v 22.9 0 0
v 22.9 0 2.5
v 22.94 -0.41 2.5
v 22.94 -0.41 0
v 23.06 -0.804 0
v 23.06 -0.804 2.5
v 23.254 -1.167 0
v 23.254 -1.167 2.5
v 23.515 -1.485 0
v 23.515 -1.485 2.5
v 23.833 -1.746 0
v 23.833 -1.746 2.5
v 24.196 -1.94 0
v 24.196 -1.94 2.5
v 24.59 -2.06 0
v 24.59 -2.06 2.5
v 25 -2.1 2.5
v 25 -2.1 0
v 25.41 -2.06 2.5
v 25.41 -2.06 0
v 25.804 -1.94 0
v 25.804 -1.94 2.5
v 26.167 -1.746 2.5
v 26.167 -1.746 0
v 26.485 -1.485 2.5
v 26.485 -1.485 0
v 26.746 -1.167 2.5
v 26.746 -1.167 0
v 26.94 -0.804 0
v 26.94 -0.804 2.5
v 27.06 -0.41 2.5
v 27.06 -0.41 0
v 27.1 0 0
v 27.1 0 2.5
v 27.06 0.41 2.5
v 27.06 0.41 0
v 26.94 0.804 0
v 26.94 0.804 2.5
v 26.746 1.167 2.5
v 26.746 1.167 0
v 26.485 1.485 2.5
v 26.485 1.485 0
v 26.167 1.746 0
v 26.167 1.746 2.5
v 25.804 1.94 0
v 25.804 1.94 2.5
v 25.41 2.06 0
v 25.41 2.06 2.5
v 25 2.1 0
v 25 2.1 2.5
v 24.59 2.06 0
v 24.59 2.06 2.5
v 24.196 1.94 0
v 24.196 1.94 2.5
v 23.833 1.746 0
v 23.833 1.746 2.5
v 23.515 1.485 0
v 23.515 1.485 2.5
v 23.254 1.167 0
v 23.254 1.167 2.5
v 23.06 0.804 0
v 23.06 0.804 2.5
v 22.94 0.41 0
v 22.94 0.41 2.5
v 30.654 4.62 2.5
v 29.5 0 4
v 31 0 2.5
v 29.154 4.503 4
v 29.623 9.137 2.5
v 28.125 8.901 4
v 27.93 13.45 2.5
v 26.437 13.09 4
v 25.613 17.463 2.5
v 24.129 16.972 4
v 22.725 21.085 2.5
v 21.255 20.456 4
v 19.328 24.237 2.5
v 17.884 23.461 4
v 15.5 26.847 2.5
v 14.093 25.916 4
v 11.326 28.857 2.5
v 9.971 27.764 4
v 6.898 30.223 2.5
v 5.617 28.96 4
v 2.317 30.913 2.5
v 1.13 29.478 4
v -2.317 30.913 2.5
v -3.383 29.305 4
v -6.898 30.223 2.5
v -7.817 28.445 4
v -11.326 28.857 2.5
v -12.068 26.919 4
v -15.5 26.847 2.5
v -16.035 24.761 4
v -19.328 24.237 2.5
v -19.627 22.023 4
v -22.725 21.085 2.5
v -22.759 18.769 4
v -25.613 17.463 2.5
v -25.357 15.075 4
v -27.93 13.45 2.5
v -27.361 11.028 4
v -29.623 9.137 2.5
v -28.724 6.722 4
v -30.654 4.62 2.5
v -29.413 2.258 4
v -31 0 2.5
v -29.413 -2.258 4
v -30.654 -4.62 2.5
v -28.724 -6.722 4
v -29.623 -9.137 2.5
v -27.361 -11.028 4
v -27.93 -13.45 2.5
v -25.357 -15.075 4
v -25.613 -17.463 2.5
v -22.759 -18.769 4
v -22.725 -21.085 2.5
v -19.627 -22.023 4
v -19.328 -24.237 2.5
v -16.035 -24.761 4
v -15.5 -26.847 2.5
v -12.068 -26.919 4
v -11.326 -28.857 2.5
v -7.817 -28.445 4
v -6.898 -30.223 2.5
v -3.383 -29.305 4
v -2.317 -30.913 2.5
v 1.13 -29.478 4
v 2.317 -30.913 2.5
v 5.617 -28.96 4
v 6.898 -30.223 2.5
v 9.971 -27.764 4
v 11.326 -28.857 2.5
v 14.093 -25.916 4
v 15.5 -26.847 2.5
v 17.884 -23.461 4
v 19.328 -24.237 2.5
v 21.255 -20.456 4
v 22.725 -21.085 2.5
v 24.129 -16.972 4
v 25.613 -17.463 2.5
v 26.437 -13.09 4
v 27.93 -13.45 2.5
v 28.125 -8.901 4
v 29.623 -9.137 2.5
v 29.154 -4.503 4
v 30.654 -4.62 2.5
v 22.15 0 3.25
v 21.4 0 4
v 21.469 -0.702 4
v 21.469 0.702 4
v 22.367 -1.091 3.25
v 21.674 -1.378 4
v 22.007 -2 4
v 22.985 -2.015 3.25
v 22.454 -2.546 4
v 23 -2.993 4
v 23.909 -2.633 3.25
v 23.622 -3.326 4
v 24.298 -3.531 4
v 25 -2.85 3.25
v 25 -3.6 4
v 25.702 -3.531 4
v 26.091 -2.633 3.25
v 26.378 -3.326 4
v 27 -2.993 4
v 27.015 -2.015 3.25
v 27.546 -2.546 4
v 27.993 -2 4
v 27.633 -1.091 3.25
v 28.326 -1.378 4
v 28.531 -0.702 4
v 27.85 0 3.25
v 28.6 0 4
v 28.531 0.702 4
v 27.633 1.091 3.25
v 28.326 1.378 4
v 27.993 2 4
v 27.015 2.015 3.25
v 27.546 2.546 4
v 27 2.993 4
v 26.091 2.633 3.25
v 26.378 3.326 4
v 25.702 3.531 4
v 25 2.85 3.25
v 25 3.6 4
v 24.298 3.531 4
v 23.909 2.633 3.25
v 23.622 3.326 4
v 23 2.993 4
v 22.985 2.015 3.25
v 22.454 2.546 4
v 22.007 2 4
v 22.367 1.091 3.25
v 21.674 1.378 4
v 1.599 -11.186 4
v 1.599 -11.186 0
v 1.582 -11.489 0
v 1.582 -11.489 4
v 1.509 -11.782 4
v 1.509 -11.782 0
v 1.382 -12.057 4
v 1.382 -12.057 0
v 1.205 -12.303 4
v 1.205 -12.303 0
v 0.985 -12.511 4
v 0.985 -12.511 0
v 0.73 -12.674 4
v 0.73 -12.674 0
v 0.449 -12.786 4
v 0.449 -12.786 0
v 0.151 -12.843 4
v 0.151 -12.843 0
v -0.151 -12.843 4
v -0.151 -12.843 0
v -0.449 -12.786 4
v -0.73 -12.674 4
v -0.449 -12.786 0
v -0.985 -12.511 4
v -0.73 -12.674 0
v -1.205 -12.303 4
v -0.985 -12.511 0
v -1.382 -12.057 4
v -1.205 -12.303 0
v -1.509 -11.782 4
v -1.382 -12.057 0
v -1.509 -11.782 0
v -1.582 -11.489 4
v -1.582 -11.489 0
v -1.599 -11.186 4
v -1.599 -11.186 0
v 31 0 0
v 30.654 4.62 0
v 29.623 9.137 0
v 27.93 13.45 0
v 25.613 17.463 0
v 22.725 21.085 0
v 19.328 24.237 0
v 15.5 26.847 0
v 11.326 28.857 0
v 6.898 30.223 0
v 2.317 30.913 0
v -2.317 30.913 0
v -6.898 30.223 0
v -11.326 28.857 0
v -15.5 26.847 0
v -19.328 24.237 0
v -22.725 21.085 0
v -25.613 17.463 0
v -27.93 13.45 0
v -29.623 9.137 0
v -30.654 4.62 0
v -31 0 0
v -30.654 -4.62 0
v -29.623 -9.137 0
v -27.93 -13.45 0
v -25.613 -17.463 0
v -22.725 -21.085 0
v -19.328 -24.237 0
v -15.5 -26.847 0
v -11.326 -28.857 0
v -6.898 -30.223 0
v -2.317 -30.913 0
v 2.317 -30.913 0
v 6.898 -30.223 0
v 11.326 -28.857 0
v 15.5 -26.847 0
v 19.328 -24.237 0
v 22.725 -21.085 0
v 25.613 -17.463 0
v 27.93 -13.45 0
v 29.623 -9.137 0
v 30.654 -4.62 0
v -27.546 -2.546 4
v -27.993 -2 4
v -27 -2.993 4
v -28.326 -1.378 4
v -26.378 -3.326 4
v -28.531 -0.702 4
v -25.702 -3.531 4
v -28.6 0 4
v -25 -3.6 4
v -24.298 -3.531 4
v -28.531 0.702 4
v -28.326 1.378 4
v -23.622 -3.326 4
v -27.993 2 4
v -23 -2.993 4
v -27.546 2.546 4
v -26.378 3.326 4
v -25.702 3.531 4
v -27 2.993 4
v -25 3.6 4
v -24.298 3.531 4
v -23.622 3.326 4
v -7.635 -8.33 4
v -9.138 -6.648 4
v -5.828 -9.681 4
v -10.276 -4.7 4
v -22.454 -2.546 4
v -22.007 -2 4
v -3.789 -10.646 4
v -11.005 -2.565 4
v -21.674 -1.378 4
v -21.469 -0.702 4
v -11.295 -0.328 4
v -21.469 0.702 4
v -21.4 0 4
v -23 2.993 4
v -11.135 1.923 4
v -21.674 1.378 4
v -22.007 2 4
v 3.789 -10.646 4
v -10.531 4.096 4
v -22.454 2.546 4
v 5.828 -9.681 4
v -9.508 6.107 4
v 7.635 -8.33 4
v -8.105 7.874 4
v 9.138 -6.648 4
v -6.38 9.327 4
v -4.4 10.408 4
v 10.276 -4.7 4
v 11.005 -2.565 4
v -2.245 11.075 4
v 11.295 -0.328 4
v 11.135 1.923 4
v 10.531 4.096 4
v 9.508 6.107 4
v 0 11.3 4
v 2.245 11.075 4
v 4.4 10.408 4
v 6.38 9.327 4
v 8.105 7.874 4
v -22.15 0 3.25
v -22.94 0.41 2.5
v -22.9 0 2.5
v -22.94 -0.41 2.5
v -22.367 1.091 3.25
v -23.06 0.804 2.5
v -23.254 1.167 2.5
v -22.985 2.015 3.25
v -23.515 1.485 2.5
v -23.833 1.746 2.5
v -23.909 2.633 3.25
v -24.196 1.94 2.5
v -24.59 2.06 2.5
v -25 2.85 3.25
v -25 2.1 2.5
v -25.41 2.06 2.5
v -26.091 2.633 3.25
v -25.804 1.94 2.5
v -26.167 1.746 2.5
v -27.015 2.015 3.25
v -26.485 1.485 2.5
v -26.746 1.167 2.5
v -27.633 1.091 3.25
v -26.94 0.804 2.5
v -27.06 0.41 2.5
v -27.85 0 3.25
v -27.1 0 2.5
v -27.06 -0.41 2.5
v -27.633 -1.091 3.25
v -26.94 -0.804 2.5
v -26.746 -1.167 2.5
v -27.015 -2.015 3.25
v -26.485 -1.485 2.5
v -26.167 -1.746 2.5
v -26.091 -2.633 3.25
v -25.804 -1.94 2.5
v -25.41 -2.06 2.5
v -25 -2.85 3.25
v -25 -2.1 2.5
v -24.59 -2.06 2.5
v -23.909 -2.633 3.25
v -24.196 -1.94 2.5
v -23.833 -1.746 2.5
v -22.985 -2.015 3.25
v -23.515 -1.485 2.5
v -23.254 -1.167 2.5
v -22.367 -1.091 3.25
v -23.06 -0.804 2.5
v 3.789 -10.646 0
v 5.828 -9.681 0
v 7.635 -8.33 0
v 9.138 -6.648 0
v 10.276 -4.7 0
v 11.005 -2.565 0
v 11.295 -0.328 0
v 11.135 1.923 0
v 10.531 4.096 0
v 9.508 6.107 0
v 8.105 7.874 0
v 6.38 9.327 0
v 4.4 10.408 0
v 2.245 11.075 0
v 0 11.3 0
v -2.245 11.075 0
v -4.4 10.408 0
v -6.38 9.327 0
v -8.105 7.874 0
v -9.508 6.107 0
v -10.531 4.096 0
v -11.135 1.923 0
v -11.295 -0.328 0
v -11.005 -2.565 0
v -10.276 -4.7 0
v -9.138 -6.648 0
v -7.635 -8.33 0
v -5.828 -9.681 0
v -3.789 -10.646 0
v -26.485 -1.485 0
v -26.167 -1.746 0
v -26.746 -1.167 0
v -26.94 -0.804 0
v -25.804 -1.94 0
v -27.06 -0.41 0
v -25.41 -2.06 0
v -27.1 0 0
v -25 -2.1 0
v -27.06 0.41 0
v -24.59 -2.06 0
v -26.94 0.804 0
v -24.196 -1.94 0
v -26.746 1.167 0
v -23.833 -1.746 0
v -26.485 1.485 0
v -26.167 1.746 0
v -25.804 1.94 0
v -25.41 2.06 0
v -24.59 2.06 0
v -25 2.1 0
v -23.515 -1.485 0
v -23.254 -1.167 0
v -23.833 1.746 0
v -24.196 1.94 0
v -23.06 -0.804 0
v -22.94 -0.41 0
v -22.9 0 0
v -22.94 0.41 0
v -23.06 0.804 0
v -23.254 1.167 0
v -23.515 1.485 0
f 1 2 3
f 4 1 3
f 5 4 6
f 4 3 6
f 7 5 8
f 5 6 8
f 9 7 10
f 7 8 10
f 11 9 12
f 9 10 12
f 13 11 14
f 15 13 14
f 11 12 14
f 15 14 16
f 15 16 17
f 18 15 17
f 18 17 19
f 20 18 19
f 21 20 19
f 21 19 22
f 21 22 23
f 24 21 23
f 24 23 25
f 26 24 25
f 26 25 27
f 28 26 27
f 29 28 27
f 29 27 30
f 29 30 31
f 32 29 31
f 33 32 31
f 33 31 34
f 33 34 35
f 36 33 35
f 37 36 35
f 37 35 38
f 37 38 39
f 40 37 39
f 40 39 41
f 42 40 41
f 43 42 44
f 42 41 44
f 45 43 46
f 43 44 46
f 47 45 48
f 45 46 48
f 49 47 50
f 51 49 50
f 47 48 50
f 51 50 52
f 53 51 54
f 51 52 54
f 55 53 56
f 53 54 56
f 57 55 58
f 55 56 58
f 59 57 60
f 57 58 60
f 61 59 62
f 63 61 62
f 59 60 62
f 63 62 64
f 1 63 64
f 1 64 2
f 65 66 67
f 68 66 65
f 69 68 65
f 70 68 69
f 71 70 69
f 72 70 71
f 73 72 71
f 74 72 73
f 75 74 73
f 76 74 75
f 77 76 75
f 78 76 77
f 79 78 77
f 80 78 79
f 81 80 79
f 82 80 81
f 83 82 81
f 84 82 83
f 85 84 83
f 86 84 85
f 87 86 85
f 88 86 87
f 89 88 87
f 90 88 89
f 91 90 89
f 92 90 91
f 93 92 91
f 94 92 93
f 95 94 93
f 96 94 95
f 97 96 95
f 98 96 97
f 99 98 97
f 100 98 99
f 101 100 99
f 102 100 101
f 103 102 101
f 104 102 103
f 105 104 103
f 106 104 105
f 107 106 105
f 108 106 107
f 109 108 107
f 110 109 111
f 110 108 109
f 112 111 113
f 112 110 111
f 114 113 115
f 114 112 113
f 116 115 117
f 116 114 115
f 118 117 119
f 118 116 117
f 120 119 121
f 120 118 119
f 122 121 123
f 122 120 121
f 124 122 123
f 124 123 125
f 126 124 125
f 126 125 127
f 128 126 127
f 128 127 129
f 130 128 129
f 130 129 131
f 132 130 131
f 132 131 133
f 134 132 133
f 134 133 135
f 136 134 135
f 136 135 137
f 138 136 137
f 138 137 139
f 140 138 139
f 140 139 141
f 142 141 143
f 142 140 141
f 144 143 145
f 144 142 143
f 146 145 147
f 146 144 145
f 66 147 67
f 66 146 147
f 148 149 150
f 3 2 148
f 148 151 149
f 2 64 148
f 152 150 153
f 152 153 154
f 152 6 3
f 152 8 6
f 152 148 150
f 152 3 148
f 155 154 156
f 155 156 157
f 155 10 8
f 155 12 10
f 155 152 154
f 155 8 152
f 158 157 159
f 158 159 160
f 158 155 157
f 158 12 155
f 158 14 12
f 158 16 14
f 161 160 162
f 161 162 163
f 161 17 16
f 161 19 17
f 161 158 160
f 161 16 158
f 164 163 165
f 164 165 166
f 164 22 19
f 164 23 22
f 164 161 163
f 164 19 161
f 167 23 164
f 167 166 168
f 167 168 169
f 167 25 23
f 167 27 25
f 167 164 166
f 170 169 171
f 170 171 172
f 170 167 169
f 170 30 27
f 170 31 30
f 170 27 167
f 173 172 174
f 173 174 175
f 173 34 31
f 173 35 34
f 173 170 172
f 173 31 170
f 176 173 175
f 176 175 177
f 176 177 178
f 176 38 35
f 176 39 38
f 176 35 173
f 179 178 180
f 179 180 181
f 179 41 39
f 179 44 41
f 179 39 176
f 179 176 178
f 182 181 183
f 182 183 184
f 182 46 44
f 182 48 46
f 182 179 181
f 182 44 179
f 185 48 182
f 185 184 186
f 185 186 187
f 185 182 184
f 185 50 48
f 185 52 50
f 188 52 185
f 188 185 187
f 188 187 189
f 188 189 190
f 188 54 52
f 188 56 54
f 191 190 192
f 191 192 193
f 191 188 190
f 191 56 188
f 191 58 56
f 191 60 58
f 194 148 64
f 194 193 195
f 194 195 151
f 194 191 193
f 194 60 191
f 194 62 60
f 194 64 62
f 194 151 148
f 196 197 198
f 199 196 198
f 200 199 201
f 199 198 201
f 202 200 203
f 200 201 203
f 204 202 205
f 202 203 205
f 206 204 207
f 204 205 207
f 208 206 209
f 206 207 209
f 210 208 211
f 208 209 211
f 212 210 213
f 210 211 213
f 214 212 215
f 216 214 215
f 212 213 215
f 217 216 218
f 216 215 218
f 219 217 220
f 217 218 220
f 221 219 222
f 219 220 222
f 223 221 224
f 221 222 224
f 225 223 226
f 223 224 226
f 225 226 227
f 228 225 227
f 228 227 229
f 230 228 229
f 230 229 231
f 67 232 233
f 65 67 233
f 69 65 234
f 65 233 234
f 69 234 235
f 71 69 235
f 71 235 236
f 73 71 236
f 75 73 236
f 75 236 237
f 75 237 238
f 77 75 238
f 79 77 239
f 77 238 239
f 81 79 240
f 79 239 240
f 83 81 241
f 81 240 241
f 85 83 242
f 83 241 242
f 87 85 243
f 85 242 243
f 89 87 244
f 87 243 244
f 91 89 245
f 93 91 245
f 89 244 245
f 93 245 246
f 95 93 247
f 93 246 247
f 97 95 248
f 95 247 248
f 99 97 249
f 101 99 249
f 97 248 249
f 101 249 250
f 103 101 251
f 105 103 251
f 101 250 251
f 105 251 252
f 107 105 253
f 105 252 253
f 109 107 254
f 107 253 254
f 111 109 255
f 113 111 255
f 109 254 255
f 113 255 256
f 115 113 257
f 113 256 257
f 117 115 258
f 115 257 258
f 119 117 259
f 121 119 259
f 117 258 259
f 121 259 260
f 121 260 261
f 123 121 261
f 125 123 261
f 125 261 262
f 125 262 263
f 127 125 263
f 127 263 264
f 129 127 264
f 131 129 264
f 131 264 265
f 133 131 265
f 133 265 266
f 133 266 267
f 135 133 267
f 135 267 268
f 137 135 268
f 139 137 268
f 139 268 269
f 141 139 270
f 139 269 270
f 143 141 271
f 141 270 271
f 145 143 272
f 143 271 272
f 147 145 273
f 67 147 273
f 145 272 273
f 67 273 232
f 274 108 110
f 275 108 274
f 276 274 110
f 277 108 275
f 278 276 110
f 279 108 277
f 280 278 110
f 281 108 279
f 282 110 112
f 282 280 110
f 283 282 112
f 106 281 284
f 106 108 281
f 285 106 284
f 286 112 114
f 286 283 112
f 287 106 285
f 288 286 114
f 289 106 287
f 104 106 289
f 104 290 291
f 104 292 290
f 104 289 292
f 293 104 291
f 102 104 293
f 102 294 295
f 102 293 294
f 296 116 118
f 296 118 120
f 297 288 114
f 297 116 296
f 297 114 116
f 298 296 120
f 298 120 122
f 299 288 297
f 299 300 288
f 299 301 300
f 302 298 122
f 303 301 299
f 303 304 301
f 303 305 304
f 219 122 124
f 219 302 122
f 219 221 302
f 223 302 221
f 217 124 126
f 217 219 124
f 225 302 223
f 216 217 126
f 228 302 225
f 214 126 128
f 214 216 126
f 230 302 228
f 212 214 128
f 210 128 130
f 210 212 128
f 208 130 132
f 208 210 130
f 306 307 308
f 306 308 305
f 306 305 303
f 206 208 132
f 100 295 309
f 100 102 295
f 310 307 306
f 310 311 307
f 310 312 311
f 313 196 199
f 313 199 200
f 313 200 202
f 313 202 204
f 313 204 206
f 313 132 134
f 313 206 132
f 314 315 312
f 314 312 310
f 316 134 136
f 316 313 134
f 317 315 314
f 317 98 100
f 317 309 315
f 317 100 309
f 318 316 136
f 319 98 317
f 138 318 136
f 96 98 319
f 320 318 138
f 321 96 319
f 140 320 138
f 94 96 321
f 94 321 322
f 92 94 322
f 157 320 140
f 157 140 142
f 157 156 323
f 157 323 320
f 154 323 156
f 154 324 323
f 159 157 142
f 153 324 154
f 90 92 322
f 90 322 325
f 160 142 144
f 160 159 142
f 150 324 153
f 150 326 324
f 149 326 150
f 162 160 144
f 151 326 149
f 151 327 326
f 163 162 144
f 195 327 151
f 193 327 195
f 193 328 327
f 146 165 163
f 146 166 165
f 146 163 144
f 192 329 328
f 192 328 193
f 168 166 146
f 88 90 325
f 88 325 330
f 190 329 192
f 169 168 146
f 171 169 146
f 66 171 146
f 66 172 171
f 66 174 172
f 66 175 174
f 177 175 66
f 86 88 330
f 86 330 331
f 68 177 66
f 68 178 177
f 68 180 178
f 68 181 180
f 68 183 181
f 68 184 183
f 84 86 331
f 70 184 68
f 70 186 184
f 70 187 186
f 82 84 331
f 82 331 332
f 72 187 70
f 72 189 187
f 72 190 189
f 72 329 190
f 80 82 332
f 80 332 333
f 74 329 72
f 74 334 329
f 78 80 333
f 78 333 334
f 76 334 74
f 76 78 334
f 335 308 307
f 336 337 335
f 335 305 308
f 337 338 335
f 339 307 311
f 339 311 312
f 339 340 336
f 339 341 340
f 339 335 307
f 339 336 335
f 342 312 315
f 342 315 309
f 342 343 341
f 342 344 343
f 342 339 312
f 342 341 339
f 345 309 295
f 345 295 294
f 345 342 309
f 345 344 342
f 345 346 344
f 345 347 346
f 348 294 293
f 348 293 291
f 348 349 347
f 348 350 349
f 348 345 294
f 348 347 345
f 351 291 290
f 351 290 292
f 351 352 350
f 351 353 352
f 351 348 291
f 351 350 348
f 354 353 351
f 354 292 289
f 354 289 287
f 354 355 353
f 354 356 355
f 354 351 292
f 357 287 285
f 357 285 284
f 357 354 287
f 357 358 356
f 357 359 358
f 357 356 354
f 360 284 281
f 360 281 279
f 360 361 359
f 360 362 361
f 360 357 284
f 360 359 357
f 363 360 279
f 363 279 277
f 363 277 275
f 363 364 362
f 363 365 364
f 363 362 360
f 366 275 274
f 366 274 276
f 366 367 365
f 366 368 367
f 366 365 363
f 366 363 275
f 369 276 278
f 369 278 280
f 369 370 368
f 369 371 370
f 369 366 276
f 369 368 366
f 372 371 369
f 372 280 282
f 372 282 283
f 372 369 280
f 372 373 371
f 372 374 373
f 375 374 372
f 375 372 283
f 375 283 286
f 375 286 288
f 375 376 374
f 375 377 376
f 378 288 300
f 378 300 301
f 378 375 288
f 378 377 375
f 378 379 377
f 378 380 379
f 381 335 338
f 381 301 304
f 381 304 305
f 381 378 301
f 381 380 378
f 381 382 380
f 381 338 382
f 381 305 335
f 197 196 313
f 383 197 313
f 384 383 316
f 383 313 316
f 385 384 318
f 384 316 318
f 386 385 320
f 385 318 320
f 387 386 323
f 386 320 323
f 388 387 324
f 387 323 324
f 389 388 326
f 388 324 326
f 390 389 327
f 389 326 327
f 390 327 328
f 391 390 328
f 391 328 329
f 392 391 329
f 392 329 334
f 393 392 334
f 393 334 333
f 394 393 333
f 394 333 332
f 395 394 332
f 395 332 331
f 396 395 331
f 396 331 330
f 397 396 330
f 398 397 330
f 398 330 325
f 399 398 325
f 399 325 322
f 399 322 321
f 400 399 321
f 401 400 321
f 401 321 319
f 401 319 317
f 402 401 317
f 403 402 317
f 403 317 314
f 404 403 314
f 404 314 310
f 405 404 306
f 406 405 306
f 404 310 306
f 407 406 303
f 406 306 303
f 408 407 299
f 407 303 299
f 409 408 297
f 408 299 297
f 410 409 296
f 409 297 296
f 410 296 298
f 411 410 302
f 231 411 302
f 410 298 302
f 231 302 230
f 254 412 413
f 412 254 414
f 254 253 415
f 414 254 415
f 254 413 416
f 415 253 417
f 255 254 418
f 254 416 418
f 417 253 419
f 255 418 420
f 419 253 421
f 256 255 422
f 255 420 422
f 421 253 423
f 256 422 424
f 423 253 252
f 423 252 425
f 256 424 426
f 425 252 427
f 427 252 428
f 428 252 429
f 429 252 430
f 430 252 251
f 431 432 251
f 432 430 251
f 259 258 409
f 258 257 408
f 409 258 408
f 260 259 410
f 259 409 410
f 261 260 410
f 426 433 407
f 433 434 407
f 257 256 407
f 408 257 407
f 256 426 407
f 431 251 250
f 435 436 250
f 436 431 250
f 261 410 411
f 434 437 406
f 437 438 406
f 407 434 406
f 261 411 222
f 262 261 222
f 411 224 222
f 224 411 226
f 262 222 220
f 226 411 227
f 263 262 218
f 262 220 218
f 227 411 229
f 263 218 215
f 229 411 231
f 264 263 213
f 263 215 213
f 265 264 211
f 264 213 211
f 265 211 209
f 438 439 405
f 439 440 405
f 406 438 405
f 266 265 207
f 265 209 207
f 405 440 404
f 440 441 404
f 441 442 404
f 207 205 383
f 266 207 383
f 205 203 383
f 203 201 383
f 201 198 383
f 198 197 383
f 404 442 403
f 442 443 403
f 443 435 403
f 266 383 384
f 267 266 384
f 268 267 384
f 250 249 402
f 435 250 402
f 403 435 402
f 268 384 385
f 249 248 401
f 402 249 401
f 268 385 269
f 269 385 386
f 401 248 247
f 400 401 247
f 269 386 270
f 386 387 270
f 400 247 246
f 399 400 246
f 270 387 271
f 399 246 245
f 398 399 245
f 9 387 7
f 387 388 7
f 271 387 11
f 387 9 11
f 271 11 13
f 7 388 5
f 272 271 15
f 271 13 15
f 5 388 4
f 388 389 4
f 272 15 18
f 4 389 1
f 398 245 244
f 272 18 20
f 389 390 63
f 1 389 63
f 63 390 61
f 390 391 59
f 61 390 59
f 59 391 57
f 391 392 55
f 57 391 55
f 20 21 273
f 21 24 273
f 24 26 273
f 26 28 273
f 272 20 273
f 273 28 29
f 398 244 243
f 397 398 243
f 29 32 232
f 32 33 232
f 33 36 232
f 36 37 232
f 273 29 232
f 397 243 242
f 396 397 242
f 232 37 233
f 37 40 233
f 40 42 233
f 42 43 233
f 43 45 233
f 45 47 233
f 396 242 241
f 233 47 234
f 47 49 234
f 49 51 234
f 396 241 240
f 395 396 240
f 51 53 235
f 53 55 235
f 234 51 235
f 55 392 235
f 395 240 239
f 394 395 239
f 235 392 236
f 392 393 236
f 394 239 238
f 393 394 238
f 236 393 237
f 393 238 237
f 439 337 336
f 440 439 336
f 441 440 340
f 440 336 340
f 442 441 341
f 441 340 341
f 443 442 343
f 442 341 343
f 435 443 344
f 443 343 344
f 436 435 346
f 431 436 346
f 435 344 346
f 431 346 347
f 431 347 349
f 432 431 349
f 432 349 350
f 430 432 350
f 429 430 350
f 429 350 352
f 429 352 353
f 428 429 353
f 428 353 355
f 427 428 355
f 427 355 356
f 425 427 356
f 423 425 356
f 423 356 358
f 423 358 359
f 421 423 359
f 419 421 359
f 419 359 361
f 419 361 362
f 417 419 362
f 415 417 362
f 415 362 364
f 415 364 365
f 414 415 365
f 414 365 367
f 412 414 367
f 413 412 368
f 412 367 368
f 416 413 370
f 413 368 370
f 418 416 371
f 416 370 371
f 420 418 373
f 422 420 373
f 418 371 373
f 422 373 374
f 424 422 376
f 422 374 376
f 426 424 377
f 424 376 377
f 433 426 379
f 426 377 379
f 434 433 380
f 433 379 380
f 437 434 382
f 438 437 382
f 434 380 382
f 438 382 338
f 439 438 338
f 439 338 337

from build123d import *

# Parameters (mm, degrees)
SKETCH_R           = 31
PAD_DEPTH          = 4
SKETCH002_R        = 11.3
POCKET001_DEPTH    = 4.001
SKETCH004_R        = 2.1
POCKET002_DEPTH    = 179.545866
SKETCH005_R        = 1.6
POCKET003_DEPTH    = 4.001
POLARPATTERN_COUNT = 2
CHAMFER_SIZE       = 1.5
CHAMFER001_SIZE    = 1.5


with BuildPart() as part:
    # Sketch → Pad (new body)
    with BuildSketch(Plane.XY):
        Circle(SKETCH_R)
    extrude(amount=PAD_DEPTH)

    # Sketch002 (on Face3 of Pad) → Pocket001 (cut, through all)
    with BuildSketch(Plane.XY.offset(4)):
        Circle(SKETCH002_R)
    extrude(amount=-POCKET001_DEPTH, mode=Mode.SUBTRACT)

    # Sketch004 (on Face3 of Pocket001) → Pocket002 (cut, through all)
    with BuildSketch(Plane.XY.offset(4)):
        with Locations((-25, 0)):
            Circle(SKETCH004_R)
    pocket002 = extrude(amount=-POCKET002_DEPTH, mode=Mode.SUBTRACT)

    # Sketch005 → Pocket003 (cut, through all)
    with BuildSketch(Plane(origin=(0, 0, 0), x_dir=(1, 0, 0), z_dir=(0, 0, -1))):
        with Locations((0, 11.25)):
            Circle(SKETCH005_R)
    extrude(amount=-POCKET003_DEPTH, mode=Mode.SUBTRACT)

    # PolarPattern: Pocket002 ×2 about axis
    polarpattern_axis = Axis((0, 0, 4), (0, 0, 1))
    for i in range(1, POLARPATTERN_COUNT):
        add(pocket002.rotate(polarpattern_axis, i * 360 / POLARPATTERN_COUNT), mode=Mode.SUBTRACT)

    # Chamfer
    chamfer_edges = [part.edges().sort_by_distance(p)[0] for p in [
        (-31, 0, 4),
    ]]
    chamfer(chamfer_edges, length=CHAMFER_SIZE)

    # Chamfer001
    chamfer001_edges = [part.edges().sort_by_distance(p)[0] for p in [
        (27.1, 0, 4),
        (-27.1, 0, 4),
    ]]
    chamfer(chamfer001_edges, length=CHAMFER001_SIZE)


solid = part.part
